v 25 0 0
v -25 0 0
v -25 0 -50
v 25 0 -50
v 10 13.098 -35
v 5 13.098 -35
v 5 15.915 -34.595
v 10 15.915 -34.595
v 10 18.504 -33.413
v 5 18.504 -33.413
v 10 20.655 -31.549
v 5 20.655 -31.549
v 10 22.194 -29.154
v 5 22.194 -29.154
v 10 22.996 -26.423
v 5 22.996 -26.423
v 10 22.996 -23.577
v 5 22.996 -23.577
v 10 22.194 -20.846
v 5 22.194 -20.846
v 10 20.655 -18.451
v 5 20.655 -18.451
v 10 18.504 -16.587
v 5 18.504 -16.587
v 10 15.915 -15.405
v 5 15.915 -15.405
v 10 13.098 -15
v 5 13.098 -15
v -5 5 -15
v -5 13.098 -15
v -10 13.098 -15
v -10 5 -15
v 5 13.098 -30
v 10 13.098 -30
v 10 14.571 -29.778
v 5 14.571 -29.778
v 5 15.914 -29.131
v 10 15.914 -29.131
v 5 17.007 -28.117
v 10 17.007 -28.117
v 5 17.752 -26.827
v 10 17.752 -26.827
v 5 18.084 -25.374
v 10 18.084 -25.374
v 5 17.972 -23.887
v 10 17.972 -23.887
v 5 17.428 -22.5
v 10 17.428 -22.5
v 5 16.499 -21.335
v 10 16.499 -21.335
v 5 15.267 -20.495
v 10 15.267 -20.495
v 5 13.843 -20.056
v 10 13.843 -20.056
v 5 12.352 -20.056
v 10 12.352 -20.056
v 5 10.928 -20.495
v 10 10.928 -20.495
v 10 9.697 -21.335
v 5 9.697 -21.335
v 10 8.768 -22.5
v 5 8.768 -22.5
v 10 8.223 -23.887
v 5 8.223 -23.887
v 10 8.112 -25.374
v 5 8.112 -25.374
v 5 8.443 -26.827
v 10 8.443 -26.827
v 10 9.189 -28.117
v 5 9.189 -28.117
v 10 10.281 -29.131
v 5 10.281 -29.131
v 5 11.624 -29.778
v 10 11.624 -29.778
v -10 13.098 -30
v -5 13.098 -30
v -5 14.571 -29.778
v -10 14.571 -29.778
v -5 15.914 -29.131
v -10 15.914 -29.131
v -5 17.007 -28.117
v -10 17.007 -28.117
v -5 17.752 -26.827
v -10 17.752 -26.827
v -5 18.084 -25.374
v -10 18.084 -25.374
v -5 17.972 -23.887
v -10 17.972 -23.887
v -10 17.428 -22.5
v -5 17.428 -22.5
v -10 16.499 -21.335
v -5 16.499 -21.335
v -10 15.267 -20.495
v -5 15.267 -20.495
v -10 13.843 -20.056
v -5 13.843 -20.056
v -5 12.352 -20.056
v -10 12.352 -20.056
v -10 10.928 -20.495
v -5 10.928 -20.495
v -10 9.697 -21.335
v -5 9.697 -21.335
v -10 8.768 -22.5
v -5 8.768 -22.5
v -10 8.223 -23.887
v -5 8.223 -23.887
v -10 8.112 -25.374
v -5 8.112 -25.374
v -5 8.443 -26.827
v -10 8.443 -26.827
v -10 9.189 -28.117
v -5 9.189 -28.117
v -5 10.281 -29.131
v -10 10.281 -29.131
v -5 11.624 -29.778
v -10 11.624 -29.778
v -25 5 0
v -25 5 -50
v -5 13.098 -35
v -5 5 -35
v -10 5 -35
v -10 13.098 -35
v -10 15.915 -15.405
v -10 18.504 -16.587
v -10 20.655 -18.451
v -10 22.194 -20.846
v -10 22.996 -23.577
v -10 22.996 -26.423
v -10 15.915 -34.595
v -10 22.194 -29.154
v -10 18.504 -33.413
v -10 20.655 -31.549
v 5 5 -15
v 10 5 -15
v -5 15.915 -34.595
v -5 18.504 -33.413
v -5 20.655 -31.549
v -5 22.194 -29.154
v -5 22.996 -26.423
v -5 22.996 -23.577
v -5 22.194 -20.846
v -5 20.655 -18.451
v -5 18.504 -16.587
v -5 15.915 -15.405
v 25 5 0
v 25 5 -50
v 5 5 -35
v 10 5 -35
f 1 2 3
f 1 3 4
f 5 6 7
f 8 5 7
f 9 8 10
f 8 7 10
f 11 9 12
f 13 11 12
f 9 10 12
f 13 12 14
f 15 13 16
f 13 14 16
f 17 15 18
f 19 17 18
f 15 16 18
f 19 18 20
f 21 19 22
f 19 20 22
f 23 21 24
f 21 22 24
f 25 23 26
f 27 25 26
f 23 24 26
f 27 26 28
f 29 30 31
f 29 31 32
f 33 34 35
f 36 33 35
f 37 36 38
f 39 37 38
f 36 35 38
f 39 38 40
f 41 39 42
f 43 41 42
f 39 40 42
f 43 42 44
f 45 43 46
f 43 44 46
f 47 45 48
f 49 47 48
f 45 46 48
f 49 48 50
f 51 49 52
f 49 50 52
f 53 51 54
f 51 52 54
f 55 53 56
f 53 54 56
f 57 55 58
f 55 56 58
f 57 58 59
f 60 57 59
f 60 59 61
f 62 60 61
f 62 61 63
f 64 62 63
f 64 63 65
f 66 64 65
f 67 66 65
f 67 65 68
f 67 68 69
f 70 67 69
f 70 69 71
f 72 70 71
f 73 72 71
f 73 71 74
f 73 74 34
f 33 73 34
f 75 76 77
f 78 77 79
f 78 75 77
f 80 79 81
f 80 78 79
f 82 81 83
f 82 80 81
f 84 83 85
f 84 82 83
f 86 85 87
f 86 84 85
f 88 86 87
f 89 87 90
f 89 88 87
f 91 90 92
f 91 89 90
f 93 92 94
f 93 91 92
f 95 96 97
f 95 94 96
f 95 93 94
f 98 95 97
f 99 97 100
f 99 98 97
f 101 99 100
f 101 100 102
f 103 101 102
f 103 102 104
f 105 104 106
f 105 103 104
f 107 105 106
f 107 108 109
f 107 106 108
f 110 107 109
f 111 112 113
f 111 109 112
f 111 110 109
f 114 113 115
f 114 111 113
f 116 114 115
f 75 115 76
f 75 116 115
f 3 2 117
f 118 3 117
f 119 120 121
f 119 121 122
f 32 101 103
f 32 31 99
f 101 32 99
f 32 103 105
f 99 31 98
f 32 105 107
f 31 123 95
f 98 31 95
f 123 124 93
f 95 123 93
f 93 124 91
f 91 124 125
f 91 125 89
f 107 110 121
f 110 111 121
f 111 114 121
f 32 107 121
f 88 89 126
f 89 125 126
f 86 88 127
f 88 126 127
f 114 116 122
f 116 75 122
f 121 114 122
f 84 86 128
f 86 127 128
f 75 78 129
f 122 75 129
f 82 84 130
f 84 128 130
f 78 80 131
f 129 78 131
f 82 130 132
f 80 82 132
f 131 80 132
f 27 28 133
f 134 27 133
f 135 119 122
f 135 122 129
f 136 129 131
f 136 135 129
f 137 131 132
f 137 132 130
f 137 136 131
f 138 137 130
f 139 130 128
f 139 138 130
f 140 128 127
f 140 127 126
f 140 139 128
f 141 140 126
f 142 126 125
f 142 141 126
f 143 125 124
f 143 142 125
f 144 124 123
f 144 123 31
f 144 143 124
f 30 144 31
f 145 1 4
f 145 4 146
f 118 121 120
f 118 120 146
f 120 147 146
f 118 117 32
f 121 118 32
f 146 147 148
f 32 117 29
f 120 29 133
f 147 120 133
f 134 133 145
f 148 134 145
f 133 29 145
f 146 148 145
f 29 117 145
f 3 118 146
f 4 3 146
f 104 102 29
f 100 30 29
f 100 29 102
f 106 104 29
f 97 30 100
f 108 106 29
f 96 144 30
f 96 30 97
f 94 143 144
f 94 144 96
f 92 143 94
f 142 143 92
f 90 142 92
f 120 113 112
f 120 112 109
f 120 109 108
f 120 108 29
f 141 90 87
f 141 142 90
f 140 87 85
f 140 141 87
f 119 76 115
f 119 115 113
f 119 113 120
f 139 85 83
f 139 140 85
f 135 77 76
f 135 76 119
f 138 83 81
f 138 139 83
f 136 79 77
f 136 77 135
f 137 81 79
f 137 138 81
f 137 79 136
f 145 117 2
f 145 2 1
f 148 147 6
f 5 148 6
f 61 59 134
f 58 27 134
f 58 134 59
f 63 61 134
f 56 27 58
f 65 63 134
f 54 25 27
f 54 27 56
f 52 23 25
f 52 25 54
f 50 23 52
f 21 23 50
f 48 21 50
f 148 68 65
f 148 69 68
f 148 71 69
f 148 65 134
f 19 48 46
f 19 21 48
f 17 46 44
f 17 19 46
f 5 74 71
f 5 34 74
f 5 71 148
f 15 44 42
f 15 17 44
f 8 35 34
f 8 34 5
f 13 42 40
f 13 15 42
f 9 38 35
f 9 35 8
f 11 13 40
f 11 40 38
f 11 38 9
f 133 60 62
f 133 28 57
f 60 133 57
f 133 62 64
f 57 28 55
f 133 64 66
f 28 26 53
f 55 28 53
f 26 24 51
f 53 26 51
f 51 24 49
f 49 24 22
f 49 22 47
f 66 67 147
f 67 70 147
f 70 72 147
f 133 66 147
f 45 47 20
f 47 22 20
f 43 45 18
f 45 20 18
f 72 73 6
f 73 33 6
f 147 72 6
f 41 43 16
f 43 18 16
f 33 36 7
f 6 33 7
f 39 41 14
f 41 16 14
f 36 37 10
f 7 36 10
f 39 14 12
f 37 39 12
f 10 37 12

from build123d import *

# Parameters (mm, degrees)
SKETCH1_W           = 50
SKETCH1_H           = 5
BOSS_EXTRUDE1_DEPTH = 50
BOSS_EXTRUDE2_DEPTH = 5
SKETCH3_R           = 5
CUT_EXTRUDE1_DEPTH  = 36


with BuildPart() as part:
    # Sketch1 → Boss-Extrude1 (new body)
    with BuildSketch(Plane.XY):
        with Locations((0, 2.5)):
            Rectangle(SKETCH1_W, SKETCH1_H)
    extrude(amount=-BOSS_EXTRUDE1_DEPTH)

    # Sketch2 → Boss-Extrude2 (add)
    with BuildSketch(Plane(origin=(5, 0, 0), x_dir=(0, 0, -1), z_dir=(1, 0, 0))):
        with BuildLine():
            Line((15, 5), (35, 5))
            Line((35, 5), (35, 13.097700543))
            ThreePointArc((35, 13.097700543), (25, 23.097700543), (15, 13.097700543))
            Line((15, 13.097700543), (15, 5))
        make_face()
    boss_extrude2 = extrude(amount=BOSS_EXTRUDE2_DEPTH)

    # Sketch3 → Cut-Extrude1 (cut, through all)
    with BuildSketch(Plane(origin=(10, 0, 0), x_dir=(0, 0, -1), z_dir=(1, 0, 0))):
        with Locations((25, 13.097700543)):
            Circle(SKETCH3_R)
    cut_extrude1 = extrude(amount=-CUT_EXTRUDE1_DEPTH, mode=Mode.SUBTRACT)

    # Mirror1: Boss-Extrude2, Cut-Extrude1 across plane
    add(boss_extrude2.mirror(Plane(origin=(0, 0, 0), x_dir=(0, 0, 1), z_dir=(1, 0, 0))))
    add(cut_extrude1.mirror(Plane(origin=(0, 0, 0), x_dir=(0, 0, 1), z_dir=(1, 0, 0))), mode=Mode.SUBTRACT)


solid = part.part
